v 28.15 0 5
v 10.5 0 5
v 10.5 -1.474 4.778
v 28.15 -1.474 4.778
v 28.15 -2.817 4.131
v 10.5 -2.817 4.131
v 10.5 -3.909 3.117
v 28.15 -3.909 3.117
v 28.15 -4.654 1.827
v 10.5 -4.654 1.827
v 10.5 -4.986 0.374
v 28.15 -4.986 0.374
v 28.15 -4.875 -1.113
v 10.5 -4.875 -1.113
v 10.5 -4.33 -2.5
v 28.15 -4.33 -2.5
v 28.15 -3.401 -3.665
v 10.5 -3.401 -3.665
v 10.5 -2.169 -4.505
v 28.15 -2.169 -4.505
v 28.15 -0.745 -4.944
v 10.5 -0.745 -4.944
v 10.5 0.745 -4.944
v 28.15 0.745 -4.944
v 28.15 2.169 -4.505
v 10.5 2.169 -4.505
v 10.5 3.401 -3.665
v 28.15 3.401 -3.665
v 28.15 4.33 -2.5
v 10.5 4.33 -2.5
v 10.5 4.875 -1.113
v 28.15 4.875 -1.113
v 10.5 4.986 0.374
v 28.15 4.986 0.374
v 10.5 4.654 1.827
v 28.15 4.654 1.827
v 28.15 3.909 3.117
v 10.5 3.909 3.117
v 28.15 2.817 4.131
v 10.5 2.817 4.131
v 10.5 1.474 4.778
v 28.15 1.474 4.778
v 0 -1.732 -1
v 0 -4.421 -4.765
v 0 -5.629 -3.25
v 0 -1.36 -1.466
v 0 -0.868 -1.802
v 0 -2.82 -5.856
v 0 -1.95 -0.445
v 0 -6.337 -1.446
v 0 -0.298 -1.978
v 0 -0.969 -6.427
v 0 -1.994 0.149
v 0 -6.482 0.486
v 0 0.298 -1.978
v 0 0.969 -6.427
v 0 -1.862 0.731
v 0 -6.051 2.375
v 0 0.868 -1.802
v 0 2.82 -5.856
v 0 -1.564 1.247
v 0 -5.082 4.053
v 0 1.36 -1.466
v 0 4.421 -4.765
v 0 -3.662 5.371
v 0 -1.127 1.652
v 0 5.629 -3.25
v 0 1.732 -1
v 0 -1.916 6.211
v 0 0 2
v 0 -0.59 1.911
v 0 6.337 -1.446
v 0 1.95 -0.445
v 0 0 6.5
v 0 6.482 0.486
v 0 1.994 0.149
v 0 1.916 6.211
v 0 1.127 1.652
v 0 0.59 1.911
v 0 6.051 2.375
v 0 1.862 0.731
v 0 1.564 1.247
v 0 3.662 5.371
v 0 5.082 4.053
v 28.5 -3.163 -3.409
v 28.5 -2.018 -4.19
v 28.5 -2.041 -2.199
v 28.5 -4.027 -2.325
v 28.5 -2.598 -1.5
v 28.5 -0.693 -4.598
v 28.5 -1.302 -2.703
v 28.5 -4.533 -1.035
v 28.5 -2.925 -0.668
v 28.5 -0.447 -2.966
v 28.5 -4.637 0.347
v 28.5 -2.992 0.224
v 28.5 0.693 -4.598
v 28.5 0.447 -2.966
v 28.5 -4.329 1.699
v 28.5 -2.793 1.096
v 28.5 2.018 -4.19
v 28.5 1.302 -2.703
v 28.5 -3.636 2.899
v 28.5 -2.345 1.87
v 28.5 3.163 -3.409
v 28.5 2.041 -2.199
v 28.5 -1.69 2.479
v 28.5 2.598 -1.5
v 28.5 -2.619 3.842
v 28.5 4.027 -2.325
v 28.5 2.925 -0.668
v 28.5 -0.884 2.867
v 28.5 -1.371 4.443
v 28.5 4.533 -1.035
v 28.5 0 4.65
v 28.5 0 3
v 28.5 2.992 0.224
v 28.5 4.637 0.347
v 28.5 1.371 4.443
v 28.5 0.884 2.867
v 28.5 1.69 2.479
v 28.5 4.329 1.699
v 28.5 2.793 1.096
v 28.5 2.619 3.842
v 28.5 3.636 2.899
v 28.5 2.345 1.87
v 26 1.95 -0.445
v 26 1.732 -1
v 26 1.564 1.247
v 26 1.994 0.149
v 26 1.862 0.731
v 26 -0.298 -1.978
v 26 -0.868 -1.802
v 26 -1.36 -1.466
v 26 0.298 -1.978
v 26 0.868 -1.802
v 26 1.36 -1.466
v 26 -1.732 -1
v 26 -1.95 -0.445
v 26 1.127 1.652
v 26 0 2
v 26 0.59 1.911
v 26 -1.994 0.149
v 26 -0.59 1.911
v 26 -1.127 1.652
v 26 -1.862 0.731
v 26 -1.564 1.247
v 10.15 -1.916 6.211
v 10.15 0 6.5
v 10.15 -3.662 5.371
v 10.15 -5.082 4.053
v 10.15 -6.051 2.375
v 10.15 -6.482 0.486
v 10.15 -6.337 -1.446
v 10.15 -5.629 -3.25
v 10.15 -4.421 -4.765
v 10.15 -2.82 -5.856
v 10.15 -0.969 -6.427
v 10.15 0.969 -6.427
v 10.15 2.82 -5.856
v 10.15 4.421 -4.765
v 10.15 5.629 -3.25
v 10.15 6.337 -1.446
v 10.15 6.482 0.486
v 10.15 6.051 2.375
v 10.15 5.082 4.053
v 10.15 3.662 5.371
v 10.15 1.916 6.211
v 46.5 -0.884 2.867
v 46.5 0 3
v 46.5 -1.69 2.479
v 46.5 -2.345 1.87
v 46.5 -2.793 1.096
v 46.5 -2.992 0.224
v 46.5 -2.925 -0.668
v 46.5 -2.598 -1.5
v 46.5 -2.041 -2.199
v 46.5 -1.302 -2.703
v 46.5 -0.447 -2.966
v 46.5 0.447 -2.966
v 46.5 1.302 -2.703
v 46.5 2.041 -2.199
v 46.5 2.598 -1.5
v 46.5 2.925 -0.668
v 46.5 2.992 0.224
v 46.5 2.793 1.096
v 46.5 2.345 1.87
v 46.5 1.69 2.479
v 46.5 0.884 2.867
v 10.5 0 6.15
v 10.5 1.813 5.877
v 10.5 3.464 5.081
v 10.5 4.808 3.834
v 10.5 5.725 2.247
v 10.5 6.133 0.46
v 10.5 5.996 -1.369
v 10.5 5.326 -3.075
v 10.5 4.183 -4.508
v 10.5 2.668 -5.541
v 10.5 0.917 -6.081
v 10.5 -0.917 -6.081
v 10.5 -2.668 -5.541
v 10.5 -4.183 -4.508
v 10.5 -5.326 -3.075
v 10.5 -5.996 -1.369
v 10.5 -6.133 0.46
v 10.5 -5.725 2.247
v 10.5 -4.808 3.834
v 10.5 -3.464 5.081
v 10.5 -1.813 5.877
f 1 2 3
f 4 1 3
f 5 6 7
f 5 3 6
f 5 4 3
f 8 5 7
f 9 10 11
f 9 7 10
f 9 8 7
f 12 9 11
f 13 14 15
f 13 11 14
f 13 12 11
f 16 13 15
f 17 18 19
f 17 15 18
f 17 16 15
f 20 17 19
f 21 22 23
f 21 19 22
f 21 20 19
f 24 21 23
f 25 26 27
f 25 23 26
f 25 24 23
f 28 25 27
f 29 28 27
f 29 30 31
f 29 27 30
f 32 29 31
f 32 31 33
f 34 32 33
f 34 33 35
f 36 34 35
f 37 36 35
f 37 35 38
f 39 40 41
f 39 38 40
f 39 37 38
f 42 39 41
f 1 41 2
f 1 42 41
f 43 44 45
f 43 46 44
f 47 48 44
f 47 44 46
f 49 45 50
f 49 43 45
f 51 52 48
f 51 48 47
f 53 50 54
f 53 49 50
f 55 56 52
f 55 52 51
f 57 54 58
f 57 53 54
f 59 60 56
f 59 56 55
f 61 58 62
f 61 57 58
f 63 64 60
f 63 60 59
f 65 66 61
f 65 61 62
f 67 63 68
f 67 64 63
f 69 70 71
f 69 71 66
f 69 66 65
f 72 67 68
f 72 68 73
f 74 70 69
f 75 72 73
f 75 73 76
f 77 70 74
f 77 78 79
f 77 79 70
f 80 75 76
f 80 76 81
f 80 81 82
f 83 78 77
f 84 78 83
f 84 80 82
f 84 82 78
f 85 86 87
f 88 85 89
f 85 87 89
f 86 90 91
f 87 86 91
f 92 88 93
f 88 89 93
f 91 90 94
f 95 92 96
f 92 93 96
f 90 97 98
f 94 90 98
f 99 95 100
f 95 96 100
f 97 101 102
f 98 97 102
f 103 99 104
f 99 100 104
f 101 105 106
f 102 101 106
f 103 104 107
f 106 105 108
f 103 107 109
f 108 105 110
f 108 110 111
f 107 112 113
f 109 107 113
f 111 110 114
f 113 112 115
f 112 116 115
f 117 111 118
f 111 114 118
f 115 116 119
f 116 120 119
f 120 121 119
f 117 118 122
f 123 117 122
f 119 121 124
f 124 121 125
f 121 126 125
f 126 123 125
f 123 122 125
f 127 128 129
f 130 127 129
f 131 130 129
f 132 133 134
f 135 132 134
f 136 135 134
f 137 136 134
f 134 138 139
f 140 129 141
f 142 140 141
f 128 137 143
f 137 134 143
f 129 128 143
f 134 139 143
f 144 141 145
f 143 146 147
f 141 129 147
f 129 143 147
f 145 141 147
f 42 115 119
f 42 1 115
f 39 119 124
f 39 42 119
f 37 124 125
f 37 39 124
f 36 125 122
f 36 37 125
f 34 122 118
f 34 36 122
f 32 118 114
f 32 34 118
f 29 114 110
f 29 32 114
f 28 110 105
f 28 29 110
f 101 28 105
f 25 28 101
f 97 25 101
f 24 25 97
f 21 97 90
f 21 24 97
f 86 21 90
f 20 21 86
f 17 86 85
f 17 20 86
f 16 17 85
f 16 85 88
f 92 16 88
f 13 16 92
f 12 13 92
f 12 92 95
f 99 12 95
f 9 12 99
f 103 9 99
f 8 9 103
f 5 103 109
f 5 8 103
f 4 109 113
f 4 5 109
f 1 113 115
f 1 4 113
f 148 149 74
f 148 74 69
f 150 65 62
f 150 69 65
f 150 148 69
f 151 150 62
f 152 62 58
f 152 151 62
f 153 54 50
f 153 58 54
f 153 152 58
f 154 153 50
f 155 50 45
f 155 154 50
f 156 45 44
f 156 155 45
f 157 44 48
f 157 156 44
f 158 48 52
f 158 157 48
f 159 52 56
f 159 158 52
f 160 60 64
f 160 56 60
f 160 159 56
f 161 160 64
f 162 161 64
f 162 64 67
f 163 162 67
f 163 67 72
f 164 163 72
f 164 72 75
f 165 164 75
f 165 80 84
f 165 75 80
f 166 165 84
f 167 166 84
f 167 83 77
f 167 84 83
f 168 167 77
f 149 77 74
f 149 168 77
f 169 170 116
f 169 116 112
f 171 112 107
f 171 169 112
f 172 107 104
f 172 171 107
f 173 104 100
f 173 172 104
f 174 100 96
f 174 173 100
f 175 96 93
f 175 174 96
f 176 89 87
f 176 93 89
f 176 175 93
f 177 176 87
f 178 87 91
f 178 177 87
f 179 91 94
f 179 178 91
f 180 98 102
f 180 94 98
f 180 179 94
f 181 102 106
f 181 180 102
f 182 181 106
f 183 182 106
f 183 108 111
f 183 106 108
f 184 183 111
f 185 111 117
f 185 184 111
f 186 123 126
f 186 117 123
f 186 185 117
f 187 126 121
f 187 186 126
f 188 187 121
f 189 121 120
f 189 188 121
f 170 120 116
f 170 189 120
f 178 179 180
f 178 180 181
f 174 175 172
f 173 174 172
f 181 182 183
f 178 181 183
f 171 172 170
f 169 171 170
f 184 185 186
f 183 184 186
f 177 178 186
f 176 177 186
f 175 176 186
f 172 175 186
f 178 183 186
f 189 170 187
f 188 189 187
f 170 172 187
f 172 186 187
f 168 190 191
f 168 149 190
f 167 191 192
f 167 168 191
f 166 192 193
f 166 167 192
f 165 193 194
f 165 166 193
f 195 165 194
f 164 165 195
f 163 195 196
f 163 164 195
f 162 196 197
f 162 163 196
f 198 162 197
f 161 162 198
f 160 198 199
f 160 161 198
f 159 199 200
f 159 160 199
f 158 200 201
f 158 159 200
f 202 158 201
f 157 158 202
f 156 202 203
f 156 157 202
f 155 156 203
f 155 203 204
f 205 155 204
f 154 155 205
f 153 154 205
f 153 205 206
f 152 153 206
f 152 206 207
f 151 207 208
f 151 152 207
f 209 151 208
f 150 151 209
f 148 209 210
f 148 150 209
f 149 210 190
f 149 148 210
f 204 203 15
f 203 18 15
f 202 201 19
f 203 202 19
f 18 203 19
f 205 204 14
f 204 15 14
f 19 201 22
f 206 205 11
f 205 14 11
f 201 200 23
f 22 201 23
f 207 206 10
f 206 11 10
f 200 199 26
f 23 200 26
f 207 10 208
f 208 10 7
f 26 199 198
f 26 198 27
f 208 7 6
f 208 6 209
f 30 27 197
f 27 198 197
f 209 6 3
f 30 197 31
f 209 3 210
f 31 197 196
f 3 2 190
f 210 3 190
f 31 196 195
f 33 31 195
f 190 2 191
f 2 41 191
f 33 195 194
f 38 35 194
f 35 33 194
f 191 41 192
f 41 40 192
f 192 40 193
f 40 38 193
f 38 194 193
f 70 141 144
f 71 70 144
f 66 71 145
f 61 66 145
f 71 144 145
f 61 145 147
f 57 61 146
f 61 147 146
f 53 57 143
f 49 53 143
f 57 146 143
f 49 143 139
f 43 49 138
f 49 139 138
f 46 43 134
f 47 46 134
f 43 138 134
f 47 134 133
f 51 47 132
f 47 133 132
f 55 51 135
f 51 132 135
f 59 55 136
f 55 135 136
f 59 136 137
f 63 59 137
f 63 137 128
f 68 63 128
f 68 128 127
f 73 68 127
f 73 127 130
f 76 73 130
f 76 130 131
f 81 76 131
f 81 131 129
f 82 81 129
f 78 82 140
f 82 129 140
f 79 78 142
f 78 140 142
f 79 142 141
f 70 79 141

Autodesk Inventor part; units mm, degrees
ref_plane "YZ Plane" through (0, 0, 0) normal (1, 0, 0) x (0, 1, 0)
ref_plane "XZ Plane" through (0, 0, 0) normal (0, 1, 0) x (-1, 0, 0)
ref_plane "XY Plane" through (0, 0, 0) normal (0, 0, 1) x (1, 0, 0)
sketch "Skizze1" plane through (0, 0, 0) normal (0, 1, 0) x (-1, 0, 0)
  line L0 (0, 0) -> (0, 6.5)
  line L1 (0, 6.5) -> (-10.5, 6.5)
  line L2 (-10.5, 6.5) -> (-10.5, 5)
  line L3 (-10.5, 5) -> (-28.5, 5)
  line L4 (-28.5, 5) -> (-28.5, 3)
  line L5 (-28.5, 3) -> (-46.5, 3)
  line L6 (-46.5, 3) -> (-46.5, 0)
  line L7 (-46.5, 0) -> (0, 0)
  dimension "d0" = 46.5
  dimension "d1" = 13
  dimension "d2" = 10
  dimension "d3" = 6
  dimension "d4" = 10.5
  dimension "d5" = 18
revolve "Umdrehung1" add sketch "Skizze1" angle 360 about axis through (46.5, 0, 0) along (-1, 0, 0)
thread "Gewinde1" size "M6x1" class "6g" standard "ISO Metric profile" length 11
sketch "Skizze2" plane through (0, 0, 0) normal (-1, 0, 0) x (0, 0, 1)
  circle A0 centre (0, 0) radius 6.5 projected
  point P0 (0, 0)
hole "Bohrung1" at (0, 0, 0) direction (1, 0, 0) diameter 4 depth 26
chamfer "Fasen1" distance 0.35 angle 45 2 edges at (28.5, 0, -5) (10.5, 0, -6.5)
properties part number "102" material "Silber"
